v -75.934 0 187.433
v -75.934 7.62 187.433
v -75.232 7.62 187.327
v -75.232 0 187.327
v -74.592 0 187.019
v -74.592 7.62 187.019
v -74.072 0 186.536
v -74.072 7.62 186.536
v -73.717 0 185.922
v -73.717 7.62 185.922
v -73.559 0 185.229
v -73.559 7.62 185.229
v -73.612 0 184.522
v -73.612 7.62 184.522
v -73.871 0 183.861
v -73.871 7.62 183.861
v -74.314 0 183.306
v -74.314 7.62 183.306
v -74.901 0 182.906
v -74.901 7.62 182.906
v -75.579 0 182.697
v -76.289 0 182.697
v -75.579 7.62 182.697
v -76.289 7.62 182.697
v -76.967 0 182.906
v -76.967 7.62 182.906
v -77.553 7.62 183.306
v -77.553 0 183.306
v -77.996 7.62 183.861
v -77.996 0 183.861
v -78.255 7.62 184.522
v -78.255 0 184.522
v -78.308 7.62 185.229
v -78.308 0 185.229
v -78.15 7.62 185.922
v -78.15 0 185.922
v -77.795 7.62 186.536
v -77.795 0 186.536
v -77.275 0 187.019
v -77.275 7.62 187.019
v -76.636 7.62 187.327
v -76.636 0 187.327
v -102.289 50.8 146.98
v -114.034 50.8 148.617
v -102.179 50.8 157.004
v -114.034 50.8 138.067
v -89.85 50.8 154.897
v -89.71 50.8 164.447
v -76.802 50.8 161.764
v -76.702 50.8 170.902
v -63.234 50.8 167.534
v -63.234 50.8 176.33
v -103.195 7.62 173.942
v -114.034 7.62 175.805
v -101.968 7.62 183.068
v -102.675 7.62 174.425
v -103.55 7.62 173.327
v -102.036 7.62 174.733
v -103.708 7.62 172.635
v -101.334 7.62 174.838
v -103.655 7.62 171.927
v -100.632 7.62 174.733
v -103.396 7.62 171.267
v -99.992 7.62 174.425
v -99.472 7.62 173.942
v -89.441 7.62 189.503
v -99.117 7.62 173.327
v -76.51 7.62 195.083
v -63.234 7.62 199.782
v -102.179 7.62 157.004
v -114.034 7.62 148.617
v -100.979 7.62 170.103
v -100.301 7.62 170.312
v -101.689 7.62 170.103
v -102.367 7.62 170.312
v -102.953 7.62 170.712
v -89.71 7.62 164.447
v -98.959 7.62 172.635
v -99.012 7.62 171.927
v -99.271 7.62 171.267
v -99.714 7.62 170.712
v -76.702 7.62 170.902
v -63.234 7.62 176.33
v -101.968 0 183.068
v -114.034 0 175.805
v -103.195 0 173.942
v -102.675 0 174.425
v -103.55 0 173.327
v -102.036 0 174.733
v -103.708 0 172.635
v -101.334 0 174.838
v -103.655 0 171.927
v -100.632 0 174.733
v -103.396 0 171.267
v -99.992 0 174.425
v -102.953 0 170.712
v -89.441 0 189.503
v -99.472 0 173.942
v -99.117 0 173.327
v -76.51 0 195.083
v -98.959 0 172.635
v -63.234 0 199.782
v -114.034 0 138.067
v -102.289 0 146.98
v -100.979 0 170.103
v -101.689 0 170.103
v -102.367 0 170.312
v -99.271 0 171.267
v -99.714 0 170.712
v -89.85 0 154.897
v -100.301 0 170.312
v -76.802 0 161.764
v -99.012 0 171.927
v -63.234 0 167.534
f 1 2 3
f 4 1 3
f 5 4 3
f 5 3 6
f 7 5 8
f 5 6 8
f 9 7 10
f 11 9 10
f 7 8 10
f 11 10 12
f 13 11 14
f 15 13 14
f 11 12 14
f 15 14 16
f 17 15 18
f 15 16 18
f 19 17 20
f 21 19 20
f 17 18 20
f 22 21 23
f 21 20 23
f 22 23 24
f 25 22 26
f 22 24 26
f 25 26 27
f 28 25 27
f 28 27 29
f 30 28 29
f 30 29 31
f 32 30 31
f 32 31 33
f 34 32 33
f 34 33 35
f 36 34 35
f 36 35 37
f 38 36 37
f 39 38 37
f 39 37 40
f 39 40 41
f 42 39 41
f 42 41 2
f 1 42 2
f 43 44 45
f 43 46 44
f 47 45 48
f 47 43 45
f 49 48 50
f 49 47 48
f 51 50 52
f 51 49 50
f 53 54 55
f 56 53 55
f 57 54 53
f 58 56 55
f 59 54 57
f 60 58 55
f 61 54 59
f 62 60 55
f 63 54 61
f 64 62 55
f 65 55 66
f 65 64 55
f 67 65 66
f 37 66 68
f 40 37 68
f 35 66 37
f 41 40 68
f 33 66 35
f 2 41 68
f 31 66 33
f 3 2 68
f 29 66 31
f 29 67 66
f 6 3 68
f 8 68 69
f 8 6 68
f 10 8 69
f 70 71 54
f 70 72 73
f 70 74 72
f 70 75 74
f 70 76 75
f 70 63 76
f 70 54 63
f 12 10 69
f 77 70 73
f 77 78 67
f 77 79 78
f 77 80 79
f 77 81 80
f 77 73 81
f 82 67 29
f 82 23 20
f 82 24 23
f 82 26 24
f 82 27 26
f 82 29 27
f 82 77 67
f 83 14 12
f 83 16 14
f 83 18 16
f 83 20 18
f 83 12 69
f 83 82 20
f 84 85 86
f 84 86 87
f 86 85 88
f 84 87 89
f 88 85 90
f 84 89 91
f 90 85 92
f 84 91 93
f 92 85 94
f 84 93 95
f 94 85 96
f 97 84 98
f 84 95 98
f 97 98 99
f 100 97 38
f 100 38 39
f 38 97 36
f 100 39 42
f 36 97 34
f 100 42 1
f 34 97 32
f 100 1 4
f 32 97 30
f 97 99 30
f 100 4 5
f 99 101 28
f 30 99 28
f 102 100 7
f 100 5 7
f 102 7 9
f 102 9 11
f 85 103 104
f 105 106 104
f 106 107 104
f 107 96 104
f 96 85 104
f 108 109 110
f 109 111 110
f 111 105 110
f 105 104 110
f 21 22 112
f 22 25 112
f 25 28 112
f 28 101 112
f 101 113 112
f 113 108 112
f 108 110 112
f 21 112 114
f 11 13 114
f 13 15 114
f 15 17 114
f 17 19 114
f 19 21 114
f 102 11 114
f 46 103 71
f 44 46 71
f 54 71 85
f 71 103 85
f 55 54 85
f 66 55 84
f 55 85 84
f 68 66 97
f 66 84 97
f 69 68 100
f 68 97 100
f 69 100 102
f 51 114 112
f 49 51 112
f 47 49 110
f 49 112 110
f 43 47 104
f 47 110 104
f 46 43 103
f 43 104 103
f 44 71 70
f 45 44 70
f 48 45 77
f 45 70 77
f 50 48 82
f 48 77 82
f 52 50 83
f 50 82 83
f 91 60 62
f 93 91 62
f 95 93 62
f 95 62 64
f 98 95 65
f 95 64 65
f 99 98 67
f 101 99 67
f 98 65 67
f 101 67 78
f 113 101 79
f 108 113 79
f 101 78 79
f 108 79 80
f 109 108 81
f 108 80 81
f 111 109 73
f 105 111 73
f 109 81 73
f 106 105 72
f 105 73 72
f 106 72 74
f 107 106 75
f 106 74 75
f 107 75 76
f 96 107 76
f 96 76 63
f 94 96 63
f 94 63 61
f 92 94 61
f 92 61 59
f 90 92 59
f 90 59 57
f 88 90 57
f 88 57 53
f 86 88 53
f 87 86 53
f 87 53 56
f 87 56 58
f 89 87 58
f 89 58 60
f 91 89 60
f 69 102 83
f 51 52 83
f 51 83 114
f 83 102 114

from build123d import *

# Parameters (mm, degrees)
BOSS_EXTRUDE1_DEPTH = 50.8
CUT_EXTRUDE1_START  = -43.18
SKETCH2_R           = 209.55
SKETCH2_R_2         = 187.325
CUT_EXTRUDE1_DEPTH  = 43.18
SKETCH3_R           = 2.38125
CUT_EXTRUDE2_DEPTH  = 43.18


with BuildPart() as part:
    # Sketch1 → Boss-Extrude1 (new body)
    with BuildSketch(Plane(origin=(0, 0, 0), x_dir=(1, 0, 0), z_dir=(0, 1, 0))):
        with BuildLine():
            Line((-63.233720515, -199.781628509), (-63.233720515, -167.533762239))
            ThreePointArc((-63.233720515, -167.533762239), (-89.849960422, -154.896899621), (-114.033720515, -138.066561793))
            Line((-114.033720515, -138.066561793), (-114.033720515, -175.805327239))
            ThreePointArc((-114.033720515, -175.805327239), (-89.440774639, -189.503430924), (-63.233720515, -199.781628509))
        make_face()
    extrude(amount=BOSS_EXTRUDE1_DEPTH)

    # Sketch2 → Cut-Extrude1 (cut)
    with BuildSketch(Plane(origin=(0, 50.8, 0), x_dir=(1, 0, 0), z_dir=(0, 1, 0)).offset(CUT_EXTRUDE1_START)):
        Circle(SKETCH2_R)
        Circle(SKETCH2_R_2, mode=Mode.SUBTRACT)
    extrude(amount=CUT_EXTRUDE1_DEPTH, mode=Mode.SUBTRACT)

    # Sketch3 → Cut-Extrude2 (cut)
    with BuildSketch(Plane(origin=(0, 7.62, 0), x_dir=(1, 0, 0), z_dir=(0, 1, 0))):
        with Locations(Location((-101.333720515, -172.457176457, 0), (0, 0, 270))):
            Circle(SKETCH3_R)
        with Locations(Location((-75.933720515, -185.051535291, 0), (0, 0, 270))):
            Circle(SKETCH3_R)
    extrude(amount=-CUT_EXTRUDE2_DEPTH, mode=Mode.SUBTRACT)


solid = part.part
